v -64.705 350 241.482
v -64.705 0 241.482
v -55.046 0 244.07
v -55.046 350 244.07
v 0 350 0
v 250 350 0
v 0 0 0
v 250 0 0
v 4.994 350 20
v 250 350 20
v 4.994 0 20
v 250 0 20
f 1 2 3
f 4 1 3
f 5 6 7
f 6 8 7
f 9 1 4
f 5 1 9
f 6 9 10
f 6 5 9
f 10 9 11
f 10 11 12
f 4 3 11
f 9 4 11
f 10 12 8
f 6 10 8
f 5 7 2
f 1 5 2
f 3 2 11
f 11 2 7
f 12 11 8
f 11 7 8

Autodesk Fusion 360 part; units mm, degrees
sketch "Schizzo1" plane through (0, 0, 0) normal (0, 1, 0) x (1, 0, 0)
  line L0 (0, 0) -> (-64.7048, -241.4815)
  line L1 (-64.7048, -241.4815) -> (-55.0455, -244.0696)
  line L2 (-55.0455, -244.0696) -> (4.9938, -20)
  line L3 (4.9938, -20) -> (250, -20)
  line L4 (250, -20) -> (250, 0)
  line L5 (250, 0) -> (0, 0)
  dimension "d1" = 75
  dimension "d2" = 250
  dimension "d3" = 250
  dimension "d4" = 20
  dimension "d5" = 10
extrude "Estrusione1" add sketch "Schizzo1" along normal blind 350
component "Component" placed x (1, 0, 0) y (0, 1, 0) z (0, 0, 1) at (0, 0, 0)
